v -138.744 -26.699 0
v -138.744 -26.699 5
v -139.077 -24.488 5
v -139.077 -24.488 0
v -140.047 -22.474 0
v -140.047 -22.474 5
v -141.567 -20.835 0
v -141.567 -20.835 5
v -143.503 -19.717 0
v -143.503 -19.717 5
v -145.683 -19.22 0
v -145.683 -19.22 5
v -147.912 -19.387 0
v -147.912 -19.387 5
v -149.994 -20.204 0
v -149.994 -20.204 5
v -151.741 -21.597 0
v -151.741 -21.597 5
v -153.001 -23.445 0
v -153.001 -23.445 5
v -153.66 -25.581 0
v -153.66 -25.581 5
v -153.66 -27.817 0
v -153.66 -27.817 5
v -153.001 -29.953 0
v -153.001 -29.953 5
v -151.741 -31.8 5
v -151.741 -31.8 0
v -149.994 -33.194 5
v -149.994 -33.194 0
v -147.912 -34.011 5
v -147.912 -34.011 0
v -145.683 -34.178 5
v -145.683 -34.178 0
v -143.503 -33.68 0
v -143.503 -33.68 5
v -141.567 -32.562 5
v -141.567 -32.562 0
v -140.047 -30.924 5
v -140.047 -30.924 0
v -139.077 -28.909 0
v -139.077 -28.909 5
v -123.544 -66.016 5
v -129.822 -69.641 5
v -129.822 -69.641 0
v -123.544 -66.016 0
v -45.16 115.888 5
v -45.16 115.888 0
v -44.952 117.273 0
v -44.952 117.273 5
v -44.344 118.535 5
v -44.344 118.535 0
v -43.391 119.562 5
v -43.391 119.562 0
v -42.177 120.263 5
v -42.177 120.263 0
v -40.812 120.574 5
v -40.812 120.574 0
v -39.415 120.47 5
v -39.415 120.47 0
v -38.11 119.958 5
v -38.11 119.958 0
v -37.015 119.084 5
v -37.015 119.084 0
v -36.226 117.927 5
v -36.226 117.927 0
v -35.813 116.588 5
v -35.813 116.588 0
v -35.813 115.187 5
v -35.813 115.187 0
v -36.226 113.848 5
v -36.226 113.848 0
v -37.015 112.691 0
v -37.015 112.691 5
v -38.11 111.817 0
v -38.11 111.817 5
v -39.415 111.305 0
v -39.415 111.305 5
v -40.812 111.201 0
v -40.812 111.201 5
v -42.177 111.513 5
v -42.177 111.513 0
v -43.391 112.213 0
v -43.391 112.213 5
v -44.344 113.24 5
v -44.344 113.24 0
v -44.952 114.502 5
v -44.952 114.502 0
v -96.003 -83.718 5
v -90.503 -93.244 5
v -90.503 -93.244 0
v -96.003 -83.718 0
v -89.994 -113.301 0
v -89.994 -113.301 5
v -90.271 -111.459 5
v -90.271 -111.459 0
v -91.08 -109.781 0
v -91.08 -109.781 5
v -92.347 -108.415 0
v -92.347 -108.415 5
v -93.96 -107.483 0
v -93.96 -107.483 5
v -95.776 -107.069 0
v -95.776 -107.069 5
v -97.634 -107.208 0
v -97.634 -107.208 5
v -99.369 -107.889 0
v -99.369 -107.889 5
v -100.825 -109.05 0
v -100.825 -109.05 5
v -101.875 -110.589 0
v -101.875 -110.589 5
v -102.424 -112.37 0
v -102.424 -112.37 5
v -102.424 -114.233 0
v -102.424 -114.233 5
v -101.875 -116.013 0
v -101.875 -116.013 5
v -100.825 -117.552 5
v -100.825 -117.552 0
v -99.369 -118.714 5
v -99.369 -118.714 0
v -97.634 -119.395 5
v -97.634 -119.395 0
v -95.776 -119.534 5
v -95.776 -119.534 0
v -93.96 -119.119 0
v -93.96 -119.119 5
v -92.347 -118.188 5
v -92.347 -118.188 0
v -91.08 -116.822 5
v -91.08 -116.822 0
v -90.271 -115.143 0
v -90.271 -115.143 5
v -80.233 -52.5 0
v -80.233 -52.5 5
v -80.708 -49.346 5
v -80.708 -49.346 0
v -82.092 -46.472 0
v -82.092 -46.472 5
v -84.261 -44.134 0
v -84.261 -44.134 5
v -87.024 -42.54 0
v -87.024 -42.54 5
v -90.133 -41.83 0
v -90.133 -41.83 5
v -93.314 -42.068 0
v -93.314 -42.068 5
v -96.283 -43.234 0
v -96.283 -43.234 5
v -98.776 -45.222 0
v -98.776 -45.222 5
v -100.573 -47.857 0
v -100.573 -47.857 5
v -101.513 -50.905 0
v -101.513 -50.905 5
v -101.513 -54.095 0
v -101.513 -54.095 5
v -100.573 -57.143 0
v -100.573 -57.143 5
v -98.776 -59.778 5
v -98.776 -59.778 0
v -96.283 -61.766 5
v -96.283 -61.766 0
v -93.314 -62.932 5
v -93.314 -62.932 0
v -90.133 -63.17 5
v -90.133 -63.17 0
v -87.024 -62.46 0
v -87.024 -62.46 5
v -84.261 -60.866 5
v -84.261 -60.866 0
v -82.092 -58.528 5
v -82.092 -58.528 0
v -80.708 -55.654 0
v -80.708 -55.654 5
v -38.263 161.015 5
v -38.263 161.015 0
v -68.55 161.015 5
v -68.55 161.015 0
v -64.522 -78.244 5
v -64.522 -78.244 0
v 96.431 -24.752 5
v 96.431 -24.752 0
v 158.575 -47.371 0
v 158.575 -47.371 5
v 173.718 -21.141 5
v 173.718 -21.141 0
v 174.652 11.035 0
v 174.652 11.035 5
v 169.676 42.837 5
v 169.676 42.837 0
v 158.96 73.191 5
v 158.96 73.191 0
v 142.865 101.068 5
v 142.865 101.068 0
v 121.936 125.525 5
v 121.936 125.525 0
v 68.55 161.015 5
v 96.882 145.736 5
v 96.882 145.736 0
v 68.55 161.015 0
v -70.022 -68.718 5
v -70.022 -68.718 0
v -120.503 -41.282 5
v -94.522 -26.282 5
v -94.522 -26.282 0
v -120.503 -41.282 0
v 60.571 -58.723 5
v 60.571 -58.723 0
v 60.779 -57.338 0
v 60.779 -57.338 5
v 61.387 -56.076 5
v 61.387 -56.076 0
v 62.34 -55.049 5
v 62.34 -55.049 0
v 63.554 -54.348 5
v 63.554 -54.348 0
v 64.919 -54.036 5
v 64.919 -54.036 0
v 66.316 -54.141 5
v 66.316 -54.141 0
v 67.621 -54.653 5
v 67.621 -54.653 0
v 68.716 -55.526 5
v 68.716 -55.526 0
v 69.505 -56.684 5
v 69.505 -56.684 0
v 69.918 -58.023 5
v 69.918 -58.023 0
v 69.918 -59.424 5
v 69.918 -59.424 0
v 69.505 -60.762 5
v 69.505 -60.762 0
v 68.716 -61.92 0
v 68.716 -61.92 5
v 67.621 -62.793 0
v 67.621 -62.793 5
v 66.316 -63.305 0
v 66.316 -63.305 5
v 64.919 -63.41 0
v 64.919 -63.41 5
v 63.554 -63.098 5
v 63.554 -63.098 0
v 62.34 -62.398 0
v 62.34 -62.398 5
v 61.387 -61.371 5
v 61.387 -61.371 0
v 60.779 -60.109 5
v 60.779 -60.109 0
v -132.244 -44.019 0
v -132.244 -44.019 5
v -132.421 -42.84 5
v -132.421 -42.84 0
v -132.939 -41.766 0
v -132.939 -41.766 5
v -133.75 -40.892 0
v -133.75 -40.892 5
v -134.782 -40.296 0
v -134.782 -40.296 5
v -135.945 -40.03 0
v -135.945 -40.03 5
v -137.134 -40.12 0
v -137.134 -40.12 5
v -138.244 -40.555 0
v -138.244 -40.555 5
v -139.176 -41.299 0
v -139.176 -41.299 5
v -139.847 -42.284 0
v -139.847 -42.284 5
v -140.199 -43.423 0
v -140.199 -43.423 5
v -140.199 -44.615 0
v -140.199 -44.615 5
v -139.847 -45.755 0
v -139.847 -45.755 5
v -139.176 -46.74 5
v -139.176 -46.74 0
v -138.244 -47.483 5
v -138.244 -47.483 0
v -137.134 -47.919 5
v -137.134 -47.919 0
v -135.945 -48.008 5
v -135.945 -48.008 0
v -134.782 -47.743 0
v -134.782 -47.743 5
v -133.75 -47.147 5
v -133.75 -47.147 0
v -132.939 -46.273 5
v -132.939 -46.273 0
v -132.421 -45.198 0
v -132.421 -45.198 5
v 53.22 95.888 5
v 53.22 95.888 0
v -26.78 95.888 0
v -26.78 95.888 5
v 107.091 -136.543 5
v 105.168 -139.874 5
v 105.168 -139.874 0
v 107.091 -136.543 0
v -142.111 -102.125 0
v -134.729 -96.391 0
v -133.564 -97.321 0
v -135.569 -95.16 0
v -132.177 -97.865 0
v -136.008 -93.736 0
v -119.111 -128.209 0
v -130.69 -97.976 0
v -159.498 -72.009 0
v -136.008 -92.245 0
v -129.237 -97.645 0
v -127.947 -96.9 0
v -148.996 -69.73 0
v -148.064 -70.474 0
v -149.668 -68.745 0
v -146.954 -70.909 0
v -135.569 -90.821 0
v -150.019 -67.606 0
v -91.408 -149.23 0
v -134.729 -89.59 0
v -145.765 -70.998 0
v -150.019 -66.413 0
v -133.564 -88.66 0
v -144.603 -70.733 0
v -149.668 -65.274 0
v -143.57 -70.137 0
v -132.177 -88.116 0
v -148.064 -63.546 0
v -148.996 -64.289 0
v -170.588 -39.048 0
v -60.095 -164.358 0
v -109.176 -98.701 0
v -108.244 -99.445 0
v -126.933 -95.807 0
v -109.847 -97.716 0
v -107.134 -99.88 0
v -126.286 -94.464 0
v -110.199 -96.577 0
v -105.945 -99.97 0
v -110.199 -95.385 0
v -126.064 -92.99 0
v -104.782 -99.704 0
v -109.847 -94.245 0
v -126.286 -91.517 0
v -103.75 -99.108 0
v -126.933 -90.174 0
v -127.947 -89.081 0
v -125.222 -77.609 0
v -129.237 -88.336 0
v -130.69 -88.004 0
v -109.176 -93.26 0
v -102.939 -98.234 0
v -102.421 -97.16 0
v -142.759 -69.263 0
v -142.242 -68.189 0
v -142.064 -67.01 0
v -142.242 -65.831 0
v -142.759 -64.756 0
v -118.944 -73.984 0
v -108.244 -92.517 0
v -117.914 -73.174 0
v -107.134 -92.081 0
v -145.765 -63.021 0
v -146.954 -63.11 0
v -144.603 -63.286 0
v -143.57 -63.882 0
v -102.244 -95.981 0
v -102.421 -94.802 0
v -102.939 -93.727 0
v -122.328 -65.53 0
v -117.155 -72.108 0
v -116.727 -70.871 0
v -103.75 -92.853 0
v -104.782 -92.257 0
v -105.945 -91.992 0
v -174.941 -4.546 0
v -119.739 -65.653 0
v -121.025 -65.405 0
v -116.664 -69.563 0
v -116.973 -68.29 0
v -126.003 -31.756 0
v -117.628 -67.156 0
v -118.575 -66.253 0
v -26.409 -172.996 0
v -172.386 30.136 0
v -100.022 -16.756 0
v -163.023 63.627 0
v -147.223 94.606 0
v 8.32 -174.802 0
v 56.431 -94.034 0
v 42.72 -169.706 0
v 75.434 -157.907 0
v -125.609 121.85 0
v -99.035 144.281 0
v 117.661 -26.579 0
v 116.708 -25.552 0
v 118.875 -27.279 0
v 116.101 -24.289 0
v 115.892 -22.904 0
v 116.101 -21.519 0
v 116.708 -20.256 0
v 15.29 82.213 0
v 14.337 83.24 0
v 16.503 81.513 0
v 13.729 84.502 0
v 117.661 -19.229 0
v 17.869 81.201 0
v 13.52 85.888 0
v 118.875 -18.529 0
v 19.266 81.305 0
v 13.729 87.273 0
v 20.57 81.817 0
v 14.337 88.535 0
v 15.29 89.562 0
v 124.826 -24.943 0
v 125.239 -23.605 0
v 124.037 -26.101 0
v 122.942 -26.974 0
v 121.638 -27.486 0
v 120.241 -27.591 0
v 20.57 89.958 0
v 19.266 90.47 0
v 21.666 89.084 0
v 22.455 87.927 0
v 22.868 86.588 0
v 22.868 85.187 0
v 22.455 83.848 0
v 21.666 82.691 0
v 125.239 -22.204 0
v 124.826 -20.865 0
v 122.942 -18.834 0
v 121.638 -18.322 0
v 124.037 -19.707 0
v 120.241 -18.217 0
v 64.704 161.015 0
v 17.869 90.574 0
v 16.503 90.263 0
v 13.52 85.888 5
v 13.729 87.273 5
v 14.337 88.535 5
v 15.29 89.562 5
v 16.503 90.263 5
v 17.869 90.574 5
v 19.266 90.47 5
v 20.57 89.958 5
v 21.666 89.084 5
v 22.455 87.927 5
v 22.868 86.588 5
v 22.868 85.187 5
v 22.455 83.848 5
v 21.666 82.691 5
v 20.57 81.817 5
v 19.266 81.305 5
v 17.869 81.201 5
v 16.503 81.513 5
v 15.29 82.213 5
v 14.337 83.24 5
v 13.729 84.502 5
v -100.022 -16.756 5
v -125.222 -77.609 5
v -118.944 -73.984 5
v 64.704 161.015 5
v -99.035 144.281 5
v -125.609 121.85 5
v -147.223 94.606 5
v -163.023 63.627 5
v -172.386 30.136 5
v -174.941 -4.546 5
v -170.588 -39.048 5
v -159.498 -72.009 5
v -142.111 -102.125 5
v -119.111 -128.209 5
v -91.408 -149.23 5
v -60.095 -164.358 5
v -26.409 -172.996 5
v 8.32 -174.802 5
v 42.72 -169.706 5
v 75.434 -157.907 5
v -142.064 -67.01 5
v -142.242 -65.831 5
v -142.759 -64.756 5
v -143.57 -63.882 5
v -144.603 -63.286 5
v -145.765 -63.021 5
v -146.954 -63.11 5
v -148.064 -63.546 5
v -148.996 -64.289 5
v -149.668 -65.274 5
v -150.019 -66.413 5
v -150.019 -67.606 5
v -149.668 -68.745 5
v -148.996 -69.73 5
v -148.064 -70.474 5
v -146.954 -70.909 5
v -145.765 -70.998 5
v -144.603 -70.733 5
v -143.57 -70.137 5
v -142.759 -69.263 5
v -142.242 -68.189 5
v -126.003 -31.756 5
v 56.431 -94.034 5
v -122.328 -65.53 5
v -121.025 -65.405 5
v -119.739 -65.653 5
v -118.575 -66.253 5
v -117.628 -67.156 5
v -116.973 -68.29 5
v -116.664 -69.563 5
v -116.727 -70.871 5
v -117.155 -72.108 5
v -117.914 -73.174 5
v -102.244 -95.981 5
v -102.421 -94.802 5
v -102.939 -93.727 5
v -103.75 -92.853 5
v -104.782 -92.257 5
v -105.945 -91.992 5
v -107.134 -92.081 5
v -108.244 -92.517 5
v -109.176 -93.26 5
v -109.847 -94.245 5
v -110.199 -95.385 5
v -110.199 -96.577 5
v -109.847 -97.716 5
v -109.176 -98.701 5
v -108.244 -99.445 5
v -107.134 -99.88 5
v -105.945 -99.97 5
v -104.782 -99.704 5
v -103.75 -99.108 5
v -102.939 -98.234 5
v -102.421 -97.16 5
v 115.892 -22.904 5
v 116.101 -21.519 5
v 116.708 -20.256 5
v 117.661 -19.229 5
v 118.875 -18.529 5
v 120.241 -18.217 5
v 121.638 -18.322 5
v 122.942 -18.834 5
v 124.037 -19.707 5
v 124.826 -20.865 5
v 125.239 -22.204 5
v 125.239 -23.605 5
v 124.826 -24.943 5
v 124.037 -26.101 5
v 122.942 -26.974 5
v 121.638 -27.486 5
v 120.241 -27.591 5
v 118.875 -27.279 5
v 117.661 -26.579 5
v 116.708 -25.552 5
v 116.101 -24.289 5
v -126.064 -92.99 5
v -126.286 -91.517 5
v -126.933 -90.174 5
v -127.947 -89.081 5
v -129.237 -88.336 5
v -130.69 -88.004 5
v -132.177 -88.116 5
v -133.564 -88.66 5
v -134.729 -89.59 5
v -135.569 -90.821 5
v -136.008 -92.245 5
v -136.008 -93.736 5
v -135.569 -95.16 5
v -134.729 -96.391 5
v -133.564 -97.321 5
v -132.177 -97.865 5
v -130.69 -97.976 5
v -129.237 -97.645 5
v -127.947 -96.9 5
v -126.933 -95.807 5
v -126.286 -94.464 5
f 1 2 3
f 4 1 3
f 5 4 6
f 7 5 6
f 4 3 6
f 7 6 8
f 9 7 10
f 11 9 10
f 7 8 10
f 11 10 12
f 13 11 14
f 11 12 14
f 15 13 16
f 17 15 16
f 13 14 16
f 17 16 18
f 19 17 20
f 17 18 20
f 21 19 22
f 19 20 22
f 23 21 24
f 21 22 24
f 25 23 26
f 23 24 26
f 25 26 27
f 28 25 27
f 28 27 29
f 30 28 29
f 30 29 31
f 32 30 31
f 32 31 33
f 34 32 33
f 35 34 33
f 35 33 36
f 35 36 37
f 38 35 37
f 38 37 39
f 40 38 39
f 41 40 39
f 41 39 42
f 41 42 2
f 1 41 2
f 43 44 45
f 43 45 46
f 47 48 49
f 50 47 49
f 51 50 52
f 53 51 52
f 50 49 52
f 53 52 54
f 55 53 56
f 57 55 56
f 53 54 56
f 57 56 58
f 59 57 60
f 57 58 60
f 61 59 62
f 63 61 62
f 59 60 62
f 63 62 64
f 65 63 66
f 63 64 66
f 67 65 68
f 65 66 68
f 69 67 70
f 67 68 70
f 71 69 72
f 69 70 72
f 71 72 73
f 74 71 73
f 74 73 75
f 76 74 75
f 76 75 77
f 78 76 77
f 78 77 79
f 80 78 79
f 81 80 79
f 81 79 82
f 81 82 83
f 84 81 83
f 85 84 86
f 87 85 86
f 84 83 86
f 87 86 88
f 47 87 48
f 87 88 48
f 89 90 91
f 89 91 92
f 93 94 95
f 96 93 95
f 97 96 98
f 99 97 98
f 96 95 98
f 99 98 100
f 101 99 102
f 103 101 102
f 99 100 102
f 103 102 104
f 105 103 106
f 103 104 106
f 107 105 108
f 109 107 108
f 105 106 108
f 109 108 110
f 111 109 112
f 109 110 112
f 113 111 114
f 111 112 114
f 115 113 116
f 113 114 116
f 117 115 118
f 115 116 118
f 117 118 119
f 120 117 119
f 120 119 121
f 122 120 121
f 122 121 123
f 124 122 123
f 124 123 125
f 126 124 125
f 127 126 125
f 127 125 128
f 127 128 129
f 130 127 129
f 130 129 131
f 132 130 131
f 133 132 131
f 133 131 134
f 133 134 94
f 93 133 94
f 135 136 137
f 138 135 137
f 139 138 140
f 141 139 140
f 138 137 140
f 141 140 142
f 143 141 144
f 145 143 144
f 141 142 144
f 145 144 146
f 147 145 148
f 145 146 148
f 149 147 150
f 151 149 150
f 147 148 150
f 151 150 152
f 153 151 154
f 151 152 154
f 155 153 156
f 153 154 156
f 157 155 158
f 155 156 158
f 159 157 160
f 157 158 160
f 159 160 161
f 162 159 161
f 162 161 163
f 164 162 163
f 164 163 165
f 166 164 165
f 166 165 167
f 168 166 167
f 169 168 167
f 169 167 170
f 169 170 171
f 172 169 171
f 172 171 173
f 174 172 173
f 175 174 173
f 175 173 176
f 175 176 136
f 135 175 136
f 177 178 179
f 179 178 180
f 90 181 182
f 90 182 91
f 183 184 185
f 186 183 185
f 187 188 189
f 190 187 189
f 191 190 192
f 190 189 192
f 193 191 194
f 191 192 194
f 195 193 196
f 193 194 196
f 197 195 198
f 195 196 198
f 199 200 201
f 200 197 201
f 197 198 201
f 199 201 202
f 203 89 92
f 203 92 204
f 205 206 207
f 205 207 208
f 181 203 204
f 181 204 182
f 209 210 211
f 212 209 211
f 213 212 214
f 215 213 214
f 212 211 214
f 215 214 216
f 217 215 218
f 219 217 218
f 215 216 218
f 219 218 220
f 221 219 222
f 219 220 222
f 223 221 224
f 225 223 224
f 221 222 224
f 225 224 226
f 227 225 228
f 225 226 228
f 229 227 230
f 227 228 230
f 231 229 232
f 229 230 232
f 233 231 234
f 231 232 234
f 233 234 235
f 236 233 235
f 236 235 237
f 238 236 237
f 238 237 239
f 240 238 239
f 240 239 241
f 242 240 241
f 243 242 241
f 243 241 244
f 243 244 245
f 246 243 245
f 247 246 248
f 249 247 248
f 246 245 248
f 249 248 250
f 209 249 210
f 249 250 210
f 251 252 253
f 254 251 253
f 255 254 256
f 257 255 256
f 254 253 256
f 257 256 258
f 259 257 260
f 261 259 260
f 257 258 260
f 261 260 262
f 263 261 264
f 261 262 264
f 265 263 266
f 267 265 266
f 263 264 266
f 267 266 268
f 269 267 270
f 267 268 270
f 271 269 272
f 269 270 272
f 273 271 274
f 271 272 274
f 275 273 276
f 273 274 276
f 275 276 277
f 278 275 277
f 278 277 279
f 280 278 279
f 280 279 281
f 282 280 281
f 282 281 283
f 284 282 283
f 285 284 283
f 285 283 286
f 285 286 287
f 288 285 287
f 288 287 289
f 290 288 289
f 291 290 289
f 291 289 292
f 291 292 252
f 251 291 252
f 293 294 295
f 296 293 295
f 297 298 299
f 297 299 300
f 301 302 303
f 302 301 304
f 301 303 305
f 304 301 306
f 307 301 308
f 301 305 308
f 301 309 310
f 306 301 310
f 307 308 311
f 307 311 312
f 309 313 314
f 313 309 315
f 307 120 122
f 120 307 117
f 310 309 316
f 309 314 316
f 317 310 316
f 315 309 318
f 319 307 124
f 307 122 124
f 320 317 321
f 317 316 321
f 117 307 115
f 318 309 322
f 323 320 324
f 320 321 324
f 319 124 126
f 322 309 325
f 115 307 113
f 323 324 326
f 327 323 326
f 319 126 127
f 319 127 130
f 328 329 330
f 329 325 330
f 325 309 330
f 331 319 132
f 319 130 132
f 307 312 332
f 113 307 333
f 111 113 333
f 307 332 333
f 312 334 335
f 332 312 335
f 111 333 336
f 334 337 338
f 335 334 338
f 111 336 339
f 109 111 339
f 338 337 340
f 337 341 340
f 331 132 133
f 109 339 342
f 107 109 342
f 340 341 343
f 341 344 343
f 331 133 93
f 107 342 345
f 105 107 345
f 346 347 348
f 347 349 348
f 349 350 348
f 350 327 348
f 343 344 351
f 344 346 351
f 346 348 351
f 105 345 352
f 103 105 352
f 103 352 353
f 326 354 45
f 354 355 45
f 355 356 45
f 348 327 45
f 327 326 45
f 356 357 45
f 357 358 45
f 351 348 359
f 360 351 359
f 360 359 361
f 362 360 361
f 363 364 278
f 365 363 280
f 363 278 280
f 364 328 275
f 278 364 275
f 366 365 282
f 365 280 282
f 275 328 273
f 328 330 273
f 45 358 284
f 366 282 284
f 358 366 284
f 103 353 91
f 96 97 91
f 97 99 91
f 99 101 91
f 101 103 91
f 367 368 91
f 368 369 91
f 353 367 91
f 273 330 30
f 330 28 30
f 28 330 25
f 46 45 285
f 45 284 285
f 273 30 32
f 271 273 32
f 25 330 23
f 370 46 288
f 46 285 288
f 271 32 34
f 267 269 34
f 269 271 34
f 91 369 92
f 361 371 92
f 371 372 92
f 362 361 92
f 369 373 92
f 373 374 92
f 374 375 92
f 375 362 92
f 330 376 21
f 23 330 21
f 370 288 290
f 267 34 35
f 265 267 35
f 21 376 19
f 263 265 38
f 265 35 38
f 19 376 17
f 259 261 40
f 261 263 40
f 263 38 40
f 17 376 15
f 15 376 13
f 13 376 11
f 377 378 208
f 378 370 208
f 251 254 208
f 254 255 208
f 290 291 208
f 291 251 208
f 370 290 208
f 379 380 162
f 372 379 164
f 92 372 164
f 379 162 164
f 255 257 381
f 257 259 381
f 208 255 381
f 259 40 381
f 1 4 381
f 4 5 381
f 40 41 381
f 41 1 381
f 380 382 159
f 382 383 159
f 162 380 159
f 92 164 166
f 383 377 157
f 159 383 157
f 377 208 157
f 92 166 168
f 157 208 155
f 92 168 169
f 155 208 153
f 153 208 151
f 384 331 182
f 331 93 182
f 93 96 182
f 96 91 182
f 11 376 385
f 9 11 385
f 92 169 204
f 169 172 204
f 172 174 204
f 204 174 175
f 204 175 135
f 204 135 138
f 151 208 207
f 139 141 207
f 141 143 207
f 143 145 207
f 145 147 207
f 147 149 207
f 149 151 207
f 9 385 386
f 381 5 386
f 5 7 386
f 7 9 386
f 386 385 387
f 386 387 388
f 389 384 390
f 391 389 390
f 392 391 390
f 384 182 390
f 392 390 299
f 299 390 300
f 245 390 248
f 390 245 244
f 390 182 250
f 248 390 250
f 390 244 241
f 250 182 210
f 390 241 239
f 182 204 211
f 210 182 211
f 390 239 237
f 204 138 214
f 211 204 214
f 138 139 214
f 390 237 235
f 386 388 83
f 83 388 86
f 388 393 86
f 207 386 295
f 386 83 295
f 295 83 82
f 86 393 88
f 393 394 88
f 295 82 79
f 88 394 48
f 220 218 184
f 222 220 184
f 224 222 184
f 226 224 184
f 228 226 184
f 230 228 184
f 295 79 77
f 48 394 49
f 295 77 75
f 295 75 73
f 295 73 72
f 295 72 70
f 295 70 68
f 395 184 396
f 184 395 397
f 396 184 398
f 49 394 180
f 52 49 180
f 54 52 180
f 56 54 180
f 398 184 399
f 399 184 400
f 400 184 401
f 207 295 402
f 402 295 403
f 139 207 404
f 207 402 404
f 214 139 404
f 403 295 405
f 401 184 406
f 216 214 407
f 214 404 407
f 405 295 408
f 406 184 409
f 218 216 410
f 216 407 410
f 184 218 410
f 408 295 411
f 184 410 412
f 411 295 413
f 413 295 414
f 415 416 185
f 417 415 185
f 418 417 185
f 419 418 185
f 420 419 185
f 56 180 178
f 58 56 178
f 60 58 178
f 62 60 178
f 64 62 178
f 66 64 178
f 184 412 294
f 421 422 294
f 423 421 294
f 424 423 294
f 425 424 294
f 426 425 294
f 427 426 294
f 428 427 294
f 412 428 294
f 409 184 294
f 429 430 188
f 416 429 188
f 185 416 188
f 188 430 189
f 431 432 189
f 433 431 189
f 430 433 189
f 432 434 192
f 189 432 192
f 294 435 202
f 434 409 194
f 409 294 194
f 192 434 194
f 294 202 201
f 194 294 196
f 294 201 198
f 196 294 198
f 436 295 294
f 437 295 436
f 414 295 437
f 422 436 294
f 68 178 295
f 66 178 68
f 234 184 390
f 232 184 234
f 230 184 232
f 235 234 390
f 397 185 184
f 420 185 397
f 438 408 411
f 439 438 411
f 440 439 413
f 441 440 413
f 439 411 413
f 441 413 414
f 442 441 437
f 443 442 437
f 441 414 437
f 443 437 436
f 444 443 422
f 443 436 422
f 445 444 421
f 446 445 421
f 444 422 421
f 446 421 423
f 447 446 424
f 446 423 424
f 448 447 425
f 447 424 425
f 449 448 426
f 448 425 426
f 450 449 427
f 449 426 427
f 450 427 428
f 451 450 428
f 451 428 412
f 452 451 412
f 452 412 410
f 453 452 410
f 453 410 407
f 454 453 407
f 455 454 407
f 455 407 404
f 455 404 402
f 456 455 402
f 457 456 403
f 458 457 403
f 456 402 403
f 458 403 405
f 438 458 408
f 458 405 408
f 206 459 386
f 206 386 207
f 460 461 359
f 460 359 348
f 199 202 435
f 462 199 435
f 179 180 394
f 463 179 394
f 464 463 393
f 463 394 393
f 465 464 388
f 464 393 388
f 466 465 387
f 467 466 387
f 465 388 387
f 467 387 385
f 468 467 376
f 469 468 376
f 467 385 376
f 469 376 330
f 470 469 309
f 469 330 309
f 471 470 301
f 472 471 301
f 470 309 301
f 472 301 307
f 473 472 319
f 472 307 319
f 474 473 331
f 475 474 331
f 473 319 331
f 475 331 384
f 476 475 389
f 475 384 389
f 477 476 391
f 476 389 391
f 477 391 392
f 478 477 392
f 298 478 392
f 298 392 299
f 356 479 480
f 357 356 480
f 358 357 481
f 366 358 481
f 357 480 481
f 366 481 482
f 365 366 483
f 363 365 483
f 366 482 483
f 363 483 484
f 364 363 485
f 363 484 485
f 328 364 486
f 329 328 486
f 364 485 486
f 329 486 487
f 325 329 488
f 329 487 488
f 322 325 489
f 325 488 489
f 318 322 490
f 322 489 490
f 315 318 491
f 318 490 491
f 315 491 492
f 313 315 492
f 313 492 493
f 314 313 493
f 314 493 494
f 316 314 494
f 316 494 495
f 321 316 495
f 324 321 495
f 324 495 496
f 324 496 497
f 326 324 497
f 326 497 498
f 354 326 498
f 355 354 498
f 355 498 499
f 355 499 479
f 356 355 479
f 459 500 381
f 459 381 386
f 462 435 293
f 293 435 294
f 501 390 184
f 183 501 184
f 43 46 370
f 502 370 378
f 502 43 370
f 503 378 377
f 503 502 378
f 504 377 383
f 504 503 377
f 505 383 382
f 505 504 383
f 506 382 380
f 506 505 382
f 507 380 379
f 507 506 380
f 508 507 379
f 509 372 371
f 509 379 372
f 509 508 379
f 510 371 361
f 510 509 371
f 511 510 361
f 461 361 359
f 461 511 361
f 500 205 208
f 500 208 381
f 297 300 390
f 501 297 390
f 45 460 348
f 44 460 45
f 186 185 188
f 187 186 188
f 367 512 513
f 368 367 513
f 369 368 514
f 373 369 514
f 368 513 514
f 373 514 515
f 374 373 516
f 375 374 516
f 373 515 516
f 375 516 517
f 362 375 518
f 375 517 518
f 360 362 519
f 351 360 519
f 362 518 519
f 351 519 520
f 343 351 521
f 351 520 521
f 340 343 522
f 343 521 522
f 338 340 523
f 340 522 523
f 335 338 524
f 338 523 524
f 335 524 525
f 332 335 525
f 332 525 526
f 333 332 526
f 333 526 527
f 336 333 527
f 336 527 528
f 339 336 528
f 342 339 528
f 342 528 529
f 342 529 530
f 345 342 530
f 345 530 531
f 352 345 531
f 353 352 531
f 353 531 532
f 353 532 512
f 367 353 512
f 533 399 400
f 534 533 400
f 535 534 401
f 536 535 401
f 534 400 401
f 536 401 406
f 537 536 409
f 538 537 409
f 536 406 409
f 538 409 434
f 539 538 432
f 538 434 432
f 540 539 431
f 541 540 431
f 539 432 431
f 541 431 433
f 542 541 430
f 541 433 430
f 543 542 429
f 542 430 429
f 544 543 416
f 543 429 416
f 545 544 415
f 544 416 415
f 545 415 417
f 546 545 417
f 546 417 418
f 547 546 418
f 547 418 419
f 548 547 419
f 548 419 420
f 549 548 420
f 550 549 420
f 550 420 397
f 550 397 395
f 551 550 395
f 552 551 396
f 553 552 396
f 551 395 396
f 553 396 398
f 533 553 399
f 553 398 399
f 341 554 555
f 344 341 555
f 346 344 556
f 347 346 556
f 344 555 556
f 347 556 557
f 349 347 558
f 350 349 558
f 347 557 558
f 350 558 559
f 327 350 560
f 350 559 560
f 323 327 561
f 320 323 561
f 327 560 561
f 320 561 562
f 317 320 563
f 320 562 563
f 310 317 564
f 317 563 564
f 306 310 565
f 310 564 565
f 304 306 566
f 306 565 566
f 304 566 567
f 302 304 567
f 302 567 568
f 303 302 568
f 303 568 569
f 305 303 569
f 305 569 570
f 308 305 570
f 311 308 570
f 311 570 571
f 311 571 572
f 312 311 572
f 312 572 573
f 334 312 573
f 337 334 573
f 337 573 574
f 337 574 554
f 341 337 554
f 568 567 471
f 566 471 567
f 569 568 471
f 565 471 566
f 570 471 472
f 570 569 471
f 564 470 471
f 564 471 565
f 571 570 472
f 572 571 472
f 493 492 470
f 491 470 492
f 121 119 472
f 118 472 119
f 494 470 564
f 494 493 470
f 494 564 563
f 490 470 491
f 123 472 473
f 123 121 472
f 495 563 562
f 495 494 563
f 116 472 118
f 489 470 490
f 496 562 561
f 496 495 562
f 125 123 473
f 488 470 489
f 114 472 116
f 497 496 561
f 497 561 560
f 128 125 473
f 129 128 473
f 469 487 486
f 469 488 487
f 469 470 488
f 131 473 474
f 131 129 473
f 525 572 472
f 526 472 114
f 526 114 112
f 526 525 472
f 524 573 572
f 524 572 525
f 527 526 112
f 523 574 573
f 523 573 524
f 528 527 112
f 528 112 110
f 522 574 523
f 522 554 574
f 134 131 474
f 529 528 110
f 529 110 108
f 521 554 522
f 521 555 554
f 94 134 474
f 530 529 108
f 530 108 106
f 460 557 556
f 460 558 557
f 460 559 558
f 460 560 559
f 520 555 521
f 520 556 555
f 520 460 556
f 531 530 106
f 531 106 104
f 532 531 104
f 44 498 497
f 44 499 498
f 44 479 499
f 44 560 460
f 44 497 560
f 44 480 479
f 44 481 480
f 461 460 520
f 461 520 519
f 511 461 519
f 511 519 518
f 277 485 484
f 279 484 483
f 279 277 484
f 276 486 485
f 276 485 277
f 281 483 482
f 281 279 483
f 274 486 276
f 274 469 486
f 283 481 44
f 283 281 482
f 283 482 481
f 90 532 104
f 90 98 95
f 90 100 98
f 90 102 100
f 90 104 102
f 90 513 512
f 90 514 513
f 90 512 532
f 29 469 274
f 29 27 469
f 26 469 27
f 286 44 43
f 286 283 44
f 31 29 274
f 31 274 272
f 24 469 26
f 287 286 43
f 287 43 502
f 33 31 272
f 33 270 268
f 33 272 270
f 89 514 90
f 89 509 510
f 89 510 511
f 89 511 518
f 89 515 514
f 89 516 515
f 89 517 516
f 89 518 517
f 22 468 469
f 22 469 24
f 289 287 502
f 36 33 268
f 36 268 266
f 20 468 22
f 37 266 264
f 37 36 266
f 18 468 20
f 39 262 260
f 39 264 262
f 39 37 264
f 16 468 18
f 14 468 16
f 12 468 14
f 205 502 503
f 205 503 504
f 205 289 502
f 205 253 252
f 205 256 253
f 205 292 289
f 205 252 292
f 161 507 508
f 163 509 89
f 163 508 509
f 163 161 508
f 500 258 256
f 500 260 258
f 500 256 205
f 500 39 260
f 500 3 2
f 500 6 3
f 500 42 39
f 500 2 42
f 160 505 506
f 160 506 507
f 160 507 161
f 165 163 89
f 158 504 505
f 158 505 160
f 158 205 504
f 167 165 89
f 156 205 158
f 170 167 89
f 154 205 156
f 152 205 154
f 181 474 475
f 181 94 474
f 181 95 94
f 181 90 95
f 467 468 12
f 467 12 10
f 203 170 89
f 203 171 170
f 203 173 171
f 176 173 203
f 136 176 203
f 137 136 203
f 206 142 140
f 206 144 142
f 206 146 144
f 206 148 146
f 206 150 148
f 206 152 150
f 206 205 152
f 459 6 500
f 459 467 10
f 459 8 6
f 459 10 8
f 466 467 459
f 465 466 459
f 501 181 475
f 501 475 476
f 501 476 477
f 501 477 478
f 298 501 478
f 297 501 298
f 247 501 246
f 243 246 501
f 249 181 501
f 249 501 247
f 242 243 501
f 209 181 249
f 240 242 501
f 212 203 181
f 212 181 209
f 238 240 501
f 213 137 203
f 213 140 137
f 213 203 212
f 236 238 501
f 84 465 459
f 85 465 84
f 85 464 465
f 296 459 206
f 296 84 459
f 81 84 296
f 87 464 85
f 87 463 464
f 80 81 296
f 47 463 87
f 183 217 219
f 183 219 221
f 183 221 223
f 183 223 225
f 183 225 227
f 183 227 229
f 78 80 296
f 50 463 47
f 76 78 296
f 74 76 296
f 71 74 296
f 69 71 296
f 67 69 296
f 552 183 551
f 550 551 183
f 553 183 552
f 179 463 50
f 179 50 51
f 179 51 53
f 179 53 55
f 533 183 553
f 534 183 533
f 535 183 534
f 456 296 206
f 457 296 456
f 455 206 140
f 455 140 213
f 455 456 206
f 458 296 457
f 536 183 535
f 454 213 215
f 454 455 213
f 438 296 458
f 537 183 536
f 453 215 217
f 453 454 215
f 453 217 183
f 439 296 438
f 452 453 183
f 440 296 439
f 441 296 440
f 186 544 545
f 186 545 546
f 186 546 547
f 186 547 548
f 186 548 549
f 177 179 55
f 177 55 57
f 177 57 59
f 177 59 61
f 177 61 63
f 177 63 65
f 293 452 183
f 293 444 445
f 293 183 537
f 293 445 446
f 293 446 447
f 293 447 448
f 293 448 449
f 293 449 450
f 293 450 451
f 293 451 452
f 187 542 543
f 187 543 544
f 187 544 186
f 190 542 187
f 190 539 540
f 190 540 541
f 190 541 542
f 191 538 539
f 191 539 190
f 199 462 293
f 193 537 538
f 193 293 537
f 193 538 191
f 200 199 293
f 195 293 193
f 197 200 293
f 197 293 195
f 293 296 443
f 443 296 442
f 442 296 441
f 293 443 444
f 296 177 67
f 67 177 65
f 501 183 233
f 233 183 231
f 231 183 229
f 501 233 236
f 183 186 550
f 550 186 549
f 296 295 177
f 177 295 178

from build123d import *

# Parameters (mm, degrees)
ESQUISSE1_R             = 175
BOSS_EXTRU_1_DEPTH      = 5
ESQUISSE2_R             = 4.7
ENL_V_MAT_EXTRU_1_DEPTH = 5
LEDS_BOUT_TIRETTE_R     = 10.7
LEDS_BOUT_TIRETTE_R_2   = 6.25
LEDS_BOUT_TIRETTE_R_3   = 4
LEDS_BOUT_TIRETTE_R_4   = 5
LEDS_BOUT_TIRETTE_R_5   = 7.5
ENL_V_MAT_EXTRU_2_DEPTH = 10


with BuildPart() as part:
    # Esquisse1 → Boss.-Extru.1 (new body)
    with BuildSketch(Plane.XY):
        Circle(ESQUISSE1_R)
    extrude(amount=BOSS_EXTRU_1_DEPTH)

    # Esquisse2 → Enlèv. mat.-Extru.1 (cut)
    with BuildSketch(Plane(origin=(0, 0, 0), x_dir=(-1, 0, 0), z_dir=(0, 0, -1))):
        with Locations((-18.220426897, 85.887612711)):
            Circle(ESQUISSE2_R)
        with Locations((40.460378836, 115.887612711)):
            Circle(ESQUISSE2_R)
        with Locations((-65.270641029, -58.723158916)):
            Circle(ESQUISSE2_R)
        with Locations((-120.59180601, -22.904090436)):
            Circle(ESQUISSE2_R)
        Polygon((26.7795731, 95.88761271), (38.263317053, 161.015161015), (68.550112498, 161.015161015), (68.550112498, 190.246123658), (-94.990966298, 190.246123658), (-94.990966298, 161.015161015), (-64.704170853, 161.015161015), (-53.2204269, 95.88761271), align=None)
        Polygon((-96.430895065, -24.752015748), (-158.57487836, -47.370575906), (-173.718276082, -21.141441652), (-199.033032308, -35.756922974), (-117.262492911, -177.387651773), (-91.947736684, -162.772170451), (-107.091134406, -136.543036197), (-56.430895065, -94.034048051), align=None)
    extrude(amount=-ENL_V_MAT_EXTRU_1_DEPTH, mode=Mode.SUBTRACT)

    # Leds, bout., tirette → Enlèv. mat.-Extru.2 (cut)
    with BuildSketch(Plane.XY.offset(5)):
        with Locations((-90.932667397, -52.5)):
            Circle(LEDS_BOUT_TIRETTE_R)
        with Locations((-96.24355653, -113.301270189)):
            Circle(LEDS_BOUT_TIRETTE_R_2)
        with Locations((-136.24355653, -44.019237886)):
            Circle(LEDS_BOUT_TIRETTE_R_3)
        with Locations((-106.24355653, -95.980762114)):
            Circle(LEDS_BOUT_TIRETTE_R_3)
        with Locations((-146.064064606, -67.009618943)):
            Circle(LEDS_BOUT_TIRETTE_R_3)
        with Locations((-131.064064606, -92.990381057)):
            Circle(LEDS_BOUT_TIRETTE_R_4)
        with Locations((-146.24355653, -26.698729811)):
            Circle(LEDS_BOUT_TIRETTE_R_5)
        with BuildLine():
            Line((-118.94355653, -73.983716857), (-125.222240707, -77.608716857))
            Line((-125.222240707, -77.608716857), (-129.822240707, -69.641283143))
            Line((-129.822240707, -69.641283143), (-123.54355653, -66.016283143))
            ThreePointArc((-123.54355653, -66.016283143), (-117.259839672, -67.7), (-118.94355653, -73.983716857))
        make_face()
        Polygon((-126.003175473, -31.756098166), (-100.02241336, -16.756098166), (-94.52241336, -26.282377607), (-120.503175473, -41.282377607), align=None)
        Polygon((-96.003175473, -83.717622393), (-70.02241336, -68.717622393), (-64.52241336, -78.243901834), (-90.503175473, -93.243901834), align=None)
    extrude(amount=-ENL_V_MAT_EXTRU_2_DEPTH, mode=Mode.SUBTRACT)


solid = part.part
